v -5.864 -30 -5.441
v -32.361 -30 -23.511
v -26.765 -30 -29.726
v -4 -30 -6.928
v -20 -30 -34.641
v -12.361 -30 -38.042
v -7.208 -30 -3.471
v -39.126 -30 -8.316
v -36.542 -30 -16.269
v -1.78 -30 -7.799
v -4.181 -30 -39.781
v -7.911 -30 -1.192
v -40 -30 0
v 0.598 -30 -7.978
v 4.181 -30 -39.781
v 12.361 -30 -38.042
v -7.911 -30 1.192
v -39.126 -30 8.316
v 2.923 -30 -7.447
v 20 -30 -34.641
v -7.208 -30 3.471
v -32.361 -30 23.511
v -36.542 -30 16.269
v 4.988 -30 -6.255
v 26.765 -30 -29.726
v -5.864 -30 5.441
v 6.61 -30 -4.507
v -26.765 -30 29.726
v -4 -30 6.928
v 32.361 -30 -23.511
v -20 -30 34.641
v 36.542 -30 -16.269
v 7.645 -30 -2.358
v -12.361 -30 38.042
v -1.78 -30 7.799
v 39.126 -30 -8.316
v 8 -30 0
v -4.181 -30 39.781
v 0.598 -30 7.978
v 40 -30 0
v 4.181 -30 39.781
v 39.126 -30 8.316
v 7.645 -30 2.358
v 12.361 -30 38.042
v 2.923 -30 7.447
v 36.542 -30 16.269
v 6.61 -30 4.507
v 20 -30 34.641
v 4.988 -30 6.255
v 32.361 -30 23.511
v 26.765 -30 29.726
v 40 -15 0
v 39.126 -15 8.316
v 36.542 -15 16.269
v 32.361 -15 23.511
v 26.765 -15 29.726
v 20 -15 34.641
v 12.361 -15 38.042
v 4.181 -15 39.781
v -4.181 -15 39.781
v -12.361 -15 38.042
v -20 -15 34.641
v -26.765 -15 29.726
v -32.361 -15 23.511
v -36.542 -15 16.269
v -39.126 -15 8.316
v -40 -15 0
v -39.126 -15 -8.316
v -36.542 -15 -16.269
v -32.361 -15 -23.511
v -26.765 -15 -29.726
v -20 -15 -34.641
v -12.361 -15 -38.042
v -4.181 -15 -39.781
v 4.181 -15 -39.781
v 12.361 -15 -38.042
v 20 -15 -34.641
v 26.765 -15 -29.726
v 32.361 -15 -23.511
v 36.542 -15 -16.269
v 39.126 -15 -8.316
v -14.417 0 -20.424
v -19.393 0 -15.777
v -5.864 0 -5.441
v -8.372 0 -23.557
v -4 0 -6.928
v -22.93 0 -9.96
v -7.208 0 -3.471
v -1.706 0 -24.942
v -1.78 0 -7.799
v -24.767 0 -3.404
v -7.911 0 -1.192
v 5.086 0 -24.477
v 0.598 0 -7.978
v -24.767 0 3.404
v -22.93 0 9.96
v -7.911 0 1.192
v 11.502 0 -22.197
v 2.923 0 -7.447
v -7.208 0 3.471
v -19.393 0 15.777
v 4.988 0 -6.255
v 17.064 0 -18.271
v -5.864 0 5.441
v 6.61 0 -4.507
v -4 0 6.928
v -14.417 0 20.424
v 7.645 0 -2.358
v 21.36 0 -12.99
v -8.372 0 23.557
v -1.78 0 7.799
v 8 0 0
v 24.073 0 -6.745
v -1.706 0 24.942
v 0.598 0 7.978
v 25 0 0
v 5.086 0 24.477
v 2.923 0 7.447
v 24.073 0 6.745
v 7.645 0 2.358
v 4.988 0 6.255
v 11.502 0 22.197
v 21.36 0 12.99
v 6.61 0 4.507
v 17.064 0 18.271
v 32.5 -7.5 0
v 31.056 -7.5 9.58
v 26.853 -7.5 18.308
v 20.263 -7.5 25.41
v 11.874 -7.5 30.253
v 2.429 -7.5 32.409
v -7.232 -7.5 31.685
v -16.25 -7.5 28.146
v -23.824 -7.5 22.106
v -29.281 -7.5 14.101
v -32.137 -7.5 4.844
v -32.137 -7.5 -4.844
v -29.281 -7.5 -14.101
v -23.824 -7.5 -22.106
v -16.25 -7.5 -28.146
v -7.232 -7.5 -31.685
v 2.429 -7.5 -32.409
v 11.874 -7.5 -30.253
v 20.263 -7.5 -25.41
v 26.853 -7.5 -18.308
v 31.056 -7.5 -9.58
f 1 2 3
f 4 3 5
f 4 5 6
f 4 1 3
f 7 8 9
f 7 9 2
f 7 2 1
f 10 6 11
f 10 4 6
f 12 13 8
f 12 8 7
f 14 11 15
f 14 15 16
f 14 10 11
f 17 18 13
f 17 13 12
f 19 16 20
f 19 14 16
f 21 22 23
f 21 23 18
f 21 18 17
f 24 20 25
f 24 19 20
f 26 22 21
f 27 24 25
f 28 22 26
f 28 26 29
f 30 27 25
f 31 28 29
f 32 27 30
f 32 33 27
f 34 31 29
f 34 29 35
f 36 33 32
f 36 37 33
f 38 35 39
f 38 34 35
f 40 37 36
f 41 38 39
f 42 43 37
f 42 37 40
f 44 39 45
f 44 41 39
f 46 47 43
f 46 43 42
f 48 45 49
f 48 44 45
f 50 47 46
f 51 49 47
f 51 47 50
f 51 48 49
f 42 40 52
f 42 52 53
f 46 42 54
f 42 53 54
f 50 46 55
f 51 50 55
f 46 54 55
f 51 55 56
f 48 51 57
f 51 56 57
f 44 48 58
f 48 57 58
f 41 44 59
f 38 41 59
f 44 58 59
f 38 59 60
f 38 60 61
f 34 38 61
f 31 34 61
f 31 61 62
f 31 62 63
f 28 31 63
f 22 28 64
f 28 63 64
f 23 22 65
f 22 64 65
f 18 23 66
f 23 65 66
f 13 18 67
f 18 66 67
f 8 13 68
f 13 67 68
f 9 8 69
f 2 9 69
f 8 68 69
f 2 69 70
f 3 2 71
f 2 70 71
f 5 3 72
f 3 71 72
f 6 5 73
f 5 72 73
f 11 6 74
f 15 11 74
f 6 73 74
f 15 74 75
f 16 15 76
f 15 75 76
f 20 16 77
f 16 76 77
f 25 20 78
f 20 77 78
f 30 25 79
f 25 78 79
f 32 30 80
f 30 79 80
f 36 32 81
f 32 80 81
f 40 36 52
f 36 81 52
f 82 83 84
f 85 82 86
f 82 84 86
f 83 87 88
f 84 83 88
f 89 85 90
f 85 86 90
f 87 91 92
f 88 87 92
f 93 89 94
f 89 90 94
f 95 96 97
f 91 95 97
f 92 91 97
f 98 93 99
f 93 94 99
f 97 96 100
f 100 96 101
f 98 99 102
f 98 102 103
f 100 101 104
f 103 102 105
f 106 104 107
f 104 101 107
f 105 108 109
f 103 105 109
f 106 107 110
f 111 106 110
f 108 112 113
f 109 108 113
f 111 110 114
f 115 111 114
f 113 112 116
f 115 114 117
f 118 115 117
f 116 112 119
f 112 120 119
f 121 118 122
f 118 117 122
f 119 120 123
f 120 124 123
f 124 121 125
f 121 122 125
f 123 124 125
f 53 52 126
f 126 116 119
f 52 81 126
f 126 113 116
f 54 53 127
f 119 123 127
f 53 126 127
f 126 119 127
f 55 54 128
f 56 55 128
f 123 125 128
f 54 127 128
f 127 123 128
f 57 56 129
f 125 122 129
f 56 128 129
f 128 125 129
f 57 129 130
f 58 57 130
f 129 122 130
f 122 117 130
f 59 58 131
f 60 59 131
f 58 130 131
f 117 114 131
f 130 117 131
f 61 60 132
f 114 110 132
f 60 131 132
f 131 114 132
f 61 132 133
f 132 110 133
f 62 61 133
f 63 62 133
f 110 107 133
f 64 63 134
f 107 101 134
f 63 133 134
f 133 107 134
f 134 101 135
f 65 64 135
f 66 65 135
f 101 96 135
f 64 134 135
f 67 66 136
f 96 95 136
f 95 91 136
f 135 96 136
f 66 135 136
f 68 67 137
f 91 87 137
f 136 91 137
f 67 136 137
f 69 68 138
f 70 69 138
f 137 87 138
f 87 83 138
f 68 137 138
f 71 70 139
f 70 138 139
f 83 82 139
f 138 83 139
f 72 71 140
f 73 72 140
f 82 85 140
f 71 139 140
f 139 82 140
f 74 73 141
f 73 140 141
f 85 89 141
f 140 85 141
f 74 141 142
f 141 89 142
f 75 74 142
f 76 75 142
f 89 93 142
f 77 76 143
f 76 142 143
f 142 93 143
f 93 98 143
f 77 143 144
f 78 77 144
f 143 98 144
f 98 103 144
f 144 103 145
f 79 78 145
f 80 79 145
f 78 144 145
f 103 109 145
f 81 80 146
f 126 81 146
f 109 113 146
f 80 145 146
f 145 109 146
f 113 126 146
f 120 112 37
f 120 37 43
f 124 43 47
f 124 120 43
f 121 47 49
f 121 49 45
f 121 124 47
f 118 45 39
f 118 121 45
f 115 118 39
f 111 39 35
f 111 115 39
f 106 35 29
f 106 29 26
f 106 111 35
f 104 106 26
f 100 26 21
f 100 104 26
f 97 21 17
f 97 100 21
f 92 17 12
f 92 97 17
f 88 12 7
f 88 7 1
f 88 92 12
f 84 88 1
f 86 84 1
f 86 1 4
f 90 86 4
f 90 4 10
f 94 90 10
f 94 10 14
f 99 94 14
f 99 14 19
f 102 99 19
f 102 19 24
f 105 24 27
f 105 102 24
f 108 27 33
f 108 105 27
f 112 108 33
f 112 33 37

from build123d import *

# Parameters (mm, degrees)
F0_R     = 40
F0_R_2   = 25
F1_DEPTH = 30
F0_R_3   = 8
F2_DEPTH = 30
F3_SIZE  = 15


with BuildPart() as f1:
    # F0 (on Front) → F1 (new body)
    with BuildSketch(Plane.XZ):
        Circle(F0_R)
        Circle(F0_R_2, mode=Mode.SUBTRACT)
    extrude(amount=F1_DEPTH)

    # F0 (on Front) → F2 (join)
    with BuildSketch(Plane.XZ):
        Circle(F0_R)
        Circle(F0_R_2, mode=Mode.SUBTRACT)
        Circle(F0_R_2)
        Circle(F0_R_3, mode=Mode.SUBTRACT)
    extrude(amount=F2_DEPTH)

    # F3
    f3_edges = [f1.edges().sort_by_distance(p)[0] for p in [
        (-40, 0, 0),
    ]]
    chamfer(f3_edges, length=F3_SIZE)


solid = f1.part
